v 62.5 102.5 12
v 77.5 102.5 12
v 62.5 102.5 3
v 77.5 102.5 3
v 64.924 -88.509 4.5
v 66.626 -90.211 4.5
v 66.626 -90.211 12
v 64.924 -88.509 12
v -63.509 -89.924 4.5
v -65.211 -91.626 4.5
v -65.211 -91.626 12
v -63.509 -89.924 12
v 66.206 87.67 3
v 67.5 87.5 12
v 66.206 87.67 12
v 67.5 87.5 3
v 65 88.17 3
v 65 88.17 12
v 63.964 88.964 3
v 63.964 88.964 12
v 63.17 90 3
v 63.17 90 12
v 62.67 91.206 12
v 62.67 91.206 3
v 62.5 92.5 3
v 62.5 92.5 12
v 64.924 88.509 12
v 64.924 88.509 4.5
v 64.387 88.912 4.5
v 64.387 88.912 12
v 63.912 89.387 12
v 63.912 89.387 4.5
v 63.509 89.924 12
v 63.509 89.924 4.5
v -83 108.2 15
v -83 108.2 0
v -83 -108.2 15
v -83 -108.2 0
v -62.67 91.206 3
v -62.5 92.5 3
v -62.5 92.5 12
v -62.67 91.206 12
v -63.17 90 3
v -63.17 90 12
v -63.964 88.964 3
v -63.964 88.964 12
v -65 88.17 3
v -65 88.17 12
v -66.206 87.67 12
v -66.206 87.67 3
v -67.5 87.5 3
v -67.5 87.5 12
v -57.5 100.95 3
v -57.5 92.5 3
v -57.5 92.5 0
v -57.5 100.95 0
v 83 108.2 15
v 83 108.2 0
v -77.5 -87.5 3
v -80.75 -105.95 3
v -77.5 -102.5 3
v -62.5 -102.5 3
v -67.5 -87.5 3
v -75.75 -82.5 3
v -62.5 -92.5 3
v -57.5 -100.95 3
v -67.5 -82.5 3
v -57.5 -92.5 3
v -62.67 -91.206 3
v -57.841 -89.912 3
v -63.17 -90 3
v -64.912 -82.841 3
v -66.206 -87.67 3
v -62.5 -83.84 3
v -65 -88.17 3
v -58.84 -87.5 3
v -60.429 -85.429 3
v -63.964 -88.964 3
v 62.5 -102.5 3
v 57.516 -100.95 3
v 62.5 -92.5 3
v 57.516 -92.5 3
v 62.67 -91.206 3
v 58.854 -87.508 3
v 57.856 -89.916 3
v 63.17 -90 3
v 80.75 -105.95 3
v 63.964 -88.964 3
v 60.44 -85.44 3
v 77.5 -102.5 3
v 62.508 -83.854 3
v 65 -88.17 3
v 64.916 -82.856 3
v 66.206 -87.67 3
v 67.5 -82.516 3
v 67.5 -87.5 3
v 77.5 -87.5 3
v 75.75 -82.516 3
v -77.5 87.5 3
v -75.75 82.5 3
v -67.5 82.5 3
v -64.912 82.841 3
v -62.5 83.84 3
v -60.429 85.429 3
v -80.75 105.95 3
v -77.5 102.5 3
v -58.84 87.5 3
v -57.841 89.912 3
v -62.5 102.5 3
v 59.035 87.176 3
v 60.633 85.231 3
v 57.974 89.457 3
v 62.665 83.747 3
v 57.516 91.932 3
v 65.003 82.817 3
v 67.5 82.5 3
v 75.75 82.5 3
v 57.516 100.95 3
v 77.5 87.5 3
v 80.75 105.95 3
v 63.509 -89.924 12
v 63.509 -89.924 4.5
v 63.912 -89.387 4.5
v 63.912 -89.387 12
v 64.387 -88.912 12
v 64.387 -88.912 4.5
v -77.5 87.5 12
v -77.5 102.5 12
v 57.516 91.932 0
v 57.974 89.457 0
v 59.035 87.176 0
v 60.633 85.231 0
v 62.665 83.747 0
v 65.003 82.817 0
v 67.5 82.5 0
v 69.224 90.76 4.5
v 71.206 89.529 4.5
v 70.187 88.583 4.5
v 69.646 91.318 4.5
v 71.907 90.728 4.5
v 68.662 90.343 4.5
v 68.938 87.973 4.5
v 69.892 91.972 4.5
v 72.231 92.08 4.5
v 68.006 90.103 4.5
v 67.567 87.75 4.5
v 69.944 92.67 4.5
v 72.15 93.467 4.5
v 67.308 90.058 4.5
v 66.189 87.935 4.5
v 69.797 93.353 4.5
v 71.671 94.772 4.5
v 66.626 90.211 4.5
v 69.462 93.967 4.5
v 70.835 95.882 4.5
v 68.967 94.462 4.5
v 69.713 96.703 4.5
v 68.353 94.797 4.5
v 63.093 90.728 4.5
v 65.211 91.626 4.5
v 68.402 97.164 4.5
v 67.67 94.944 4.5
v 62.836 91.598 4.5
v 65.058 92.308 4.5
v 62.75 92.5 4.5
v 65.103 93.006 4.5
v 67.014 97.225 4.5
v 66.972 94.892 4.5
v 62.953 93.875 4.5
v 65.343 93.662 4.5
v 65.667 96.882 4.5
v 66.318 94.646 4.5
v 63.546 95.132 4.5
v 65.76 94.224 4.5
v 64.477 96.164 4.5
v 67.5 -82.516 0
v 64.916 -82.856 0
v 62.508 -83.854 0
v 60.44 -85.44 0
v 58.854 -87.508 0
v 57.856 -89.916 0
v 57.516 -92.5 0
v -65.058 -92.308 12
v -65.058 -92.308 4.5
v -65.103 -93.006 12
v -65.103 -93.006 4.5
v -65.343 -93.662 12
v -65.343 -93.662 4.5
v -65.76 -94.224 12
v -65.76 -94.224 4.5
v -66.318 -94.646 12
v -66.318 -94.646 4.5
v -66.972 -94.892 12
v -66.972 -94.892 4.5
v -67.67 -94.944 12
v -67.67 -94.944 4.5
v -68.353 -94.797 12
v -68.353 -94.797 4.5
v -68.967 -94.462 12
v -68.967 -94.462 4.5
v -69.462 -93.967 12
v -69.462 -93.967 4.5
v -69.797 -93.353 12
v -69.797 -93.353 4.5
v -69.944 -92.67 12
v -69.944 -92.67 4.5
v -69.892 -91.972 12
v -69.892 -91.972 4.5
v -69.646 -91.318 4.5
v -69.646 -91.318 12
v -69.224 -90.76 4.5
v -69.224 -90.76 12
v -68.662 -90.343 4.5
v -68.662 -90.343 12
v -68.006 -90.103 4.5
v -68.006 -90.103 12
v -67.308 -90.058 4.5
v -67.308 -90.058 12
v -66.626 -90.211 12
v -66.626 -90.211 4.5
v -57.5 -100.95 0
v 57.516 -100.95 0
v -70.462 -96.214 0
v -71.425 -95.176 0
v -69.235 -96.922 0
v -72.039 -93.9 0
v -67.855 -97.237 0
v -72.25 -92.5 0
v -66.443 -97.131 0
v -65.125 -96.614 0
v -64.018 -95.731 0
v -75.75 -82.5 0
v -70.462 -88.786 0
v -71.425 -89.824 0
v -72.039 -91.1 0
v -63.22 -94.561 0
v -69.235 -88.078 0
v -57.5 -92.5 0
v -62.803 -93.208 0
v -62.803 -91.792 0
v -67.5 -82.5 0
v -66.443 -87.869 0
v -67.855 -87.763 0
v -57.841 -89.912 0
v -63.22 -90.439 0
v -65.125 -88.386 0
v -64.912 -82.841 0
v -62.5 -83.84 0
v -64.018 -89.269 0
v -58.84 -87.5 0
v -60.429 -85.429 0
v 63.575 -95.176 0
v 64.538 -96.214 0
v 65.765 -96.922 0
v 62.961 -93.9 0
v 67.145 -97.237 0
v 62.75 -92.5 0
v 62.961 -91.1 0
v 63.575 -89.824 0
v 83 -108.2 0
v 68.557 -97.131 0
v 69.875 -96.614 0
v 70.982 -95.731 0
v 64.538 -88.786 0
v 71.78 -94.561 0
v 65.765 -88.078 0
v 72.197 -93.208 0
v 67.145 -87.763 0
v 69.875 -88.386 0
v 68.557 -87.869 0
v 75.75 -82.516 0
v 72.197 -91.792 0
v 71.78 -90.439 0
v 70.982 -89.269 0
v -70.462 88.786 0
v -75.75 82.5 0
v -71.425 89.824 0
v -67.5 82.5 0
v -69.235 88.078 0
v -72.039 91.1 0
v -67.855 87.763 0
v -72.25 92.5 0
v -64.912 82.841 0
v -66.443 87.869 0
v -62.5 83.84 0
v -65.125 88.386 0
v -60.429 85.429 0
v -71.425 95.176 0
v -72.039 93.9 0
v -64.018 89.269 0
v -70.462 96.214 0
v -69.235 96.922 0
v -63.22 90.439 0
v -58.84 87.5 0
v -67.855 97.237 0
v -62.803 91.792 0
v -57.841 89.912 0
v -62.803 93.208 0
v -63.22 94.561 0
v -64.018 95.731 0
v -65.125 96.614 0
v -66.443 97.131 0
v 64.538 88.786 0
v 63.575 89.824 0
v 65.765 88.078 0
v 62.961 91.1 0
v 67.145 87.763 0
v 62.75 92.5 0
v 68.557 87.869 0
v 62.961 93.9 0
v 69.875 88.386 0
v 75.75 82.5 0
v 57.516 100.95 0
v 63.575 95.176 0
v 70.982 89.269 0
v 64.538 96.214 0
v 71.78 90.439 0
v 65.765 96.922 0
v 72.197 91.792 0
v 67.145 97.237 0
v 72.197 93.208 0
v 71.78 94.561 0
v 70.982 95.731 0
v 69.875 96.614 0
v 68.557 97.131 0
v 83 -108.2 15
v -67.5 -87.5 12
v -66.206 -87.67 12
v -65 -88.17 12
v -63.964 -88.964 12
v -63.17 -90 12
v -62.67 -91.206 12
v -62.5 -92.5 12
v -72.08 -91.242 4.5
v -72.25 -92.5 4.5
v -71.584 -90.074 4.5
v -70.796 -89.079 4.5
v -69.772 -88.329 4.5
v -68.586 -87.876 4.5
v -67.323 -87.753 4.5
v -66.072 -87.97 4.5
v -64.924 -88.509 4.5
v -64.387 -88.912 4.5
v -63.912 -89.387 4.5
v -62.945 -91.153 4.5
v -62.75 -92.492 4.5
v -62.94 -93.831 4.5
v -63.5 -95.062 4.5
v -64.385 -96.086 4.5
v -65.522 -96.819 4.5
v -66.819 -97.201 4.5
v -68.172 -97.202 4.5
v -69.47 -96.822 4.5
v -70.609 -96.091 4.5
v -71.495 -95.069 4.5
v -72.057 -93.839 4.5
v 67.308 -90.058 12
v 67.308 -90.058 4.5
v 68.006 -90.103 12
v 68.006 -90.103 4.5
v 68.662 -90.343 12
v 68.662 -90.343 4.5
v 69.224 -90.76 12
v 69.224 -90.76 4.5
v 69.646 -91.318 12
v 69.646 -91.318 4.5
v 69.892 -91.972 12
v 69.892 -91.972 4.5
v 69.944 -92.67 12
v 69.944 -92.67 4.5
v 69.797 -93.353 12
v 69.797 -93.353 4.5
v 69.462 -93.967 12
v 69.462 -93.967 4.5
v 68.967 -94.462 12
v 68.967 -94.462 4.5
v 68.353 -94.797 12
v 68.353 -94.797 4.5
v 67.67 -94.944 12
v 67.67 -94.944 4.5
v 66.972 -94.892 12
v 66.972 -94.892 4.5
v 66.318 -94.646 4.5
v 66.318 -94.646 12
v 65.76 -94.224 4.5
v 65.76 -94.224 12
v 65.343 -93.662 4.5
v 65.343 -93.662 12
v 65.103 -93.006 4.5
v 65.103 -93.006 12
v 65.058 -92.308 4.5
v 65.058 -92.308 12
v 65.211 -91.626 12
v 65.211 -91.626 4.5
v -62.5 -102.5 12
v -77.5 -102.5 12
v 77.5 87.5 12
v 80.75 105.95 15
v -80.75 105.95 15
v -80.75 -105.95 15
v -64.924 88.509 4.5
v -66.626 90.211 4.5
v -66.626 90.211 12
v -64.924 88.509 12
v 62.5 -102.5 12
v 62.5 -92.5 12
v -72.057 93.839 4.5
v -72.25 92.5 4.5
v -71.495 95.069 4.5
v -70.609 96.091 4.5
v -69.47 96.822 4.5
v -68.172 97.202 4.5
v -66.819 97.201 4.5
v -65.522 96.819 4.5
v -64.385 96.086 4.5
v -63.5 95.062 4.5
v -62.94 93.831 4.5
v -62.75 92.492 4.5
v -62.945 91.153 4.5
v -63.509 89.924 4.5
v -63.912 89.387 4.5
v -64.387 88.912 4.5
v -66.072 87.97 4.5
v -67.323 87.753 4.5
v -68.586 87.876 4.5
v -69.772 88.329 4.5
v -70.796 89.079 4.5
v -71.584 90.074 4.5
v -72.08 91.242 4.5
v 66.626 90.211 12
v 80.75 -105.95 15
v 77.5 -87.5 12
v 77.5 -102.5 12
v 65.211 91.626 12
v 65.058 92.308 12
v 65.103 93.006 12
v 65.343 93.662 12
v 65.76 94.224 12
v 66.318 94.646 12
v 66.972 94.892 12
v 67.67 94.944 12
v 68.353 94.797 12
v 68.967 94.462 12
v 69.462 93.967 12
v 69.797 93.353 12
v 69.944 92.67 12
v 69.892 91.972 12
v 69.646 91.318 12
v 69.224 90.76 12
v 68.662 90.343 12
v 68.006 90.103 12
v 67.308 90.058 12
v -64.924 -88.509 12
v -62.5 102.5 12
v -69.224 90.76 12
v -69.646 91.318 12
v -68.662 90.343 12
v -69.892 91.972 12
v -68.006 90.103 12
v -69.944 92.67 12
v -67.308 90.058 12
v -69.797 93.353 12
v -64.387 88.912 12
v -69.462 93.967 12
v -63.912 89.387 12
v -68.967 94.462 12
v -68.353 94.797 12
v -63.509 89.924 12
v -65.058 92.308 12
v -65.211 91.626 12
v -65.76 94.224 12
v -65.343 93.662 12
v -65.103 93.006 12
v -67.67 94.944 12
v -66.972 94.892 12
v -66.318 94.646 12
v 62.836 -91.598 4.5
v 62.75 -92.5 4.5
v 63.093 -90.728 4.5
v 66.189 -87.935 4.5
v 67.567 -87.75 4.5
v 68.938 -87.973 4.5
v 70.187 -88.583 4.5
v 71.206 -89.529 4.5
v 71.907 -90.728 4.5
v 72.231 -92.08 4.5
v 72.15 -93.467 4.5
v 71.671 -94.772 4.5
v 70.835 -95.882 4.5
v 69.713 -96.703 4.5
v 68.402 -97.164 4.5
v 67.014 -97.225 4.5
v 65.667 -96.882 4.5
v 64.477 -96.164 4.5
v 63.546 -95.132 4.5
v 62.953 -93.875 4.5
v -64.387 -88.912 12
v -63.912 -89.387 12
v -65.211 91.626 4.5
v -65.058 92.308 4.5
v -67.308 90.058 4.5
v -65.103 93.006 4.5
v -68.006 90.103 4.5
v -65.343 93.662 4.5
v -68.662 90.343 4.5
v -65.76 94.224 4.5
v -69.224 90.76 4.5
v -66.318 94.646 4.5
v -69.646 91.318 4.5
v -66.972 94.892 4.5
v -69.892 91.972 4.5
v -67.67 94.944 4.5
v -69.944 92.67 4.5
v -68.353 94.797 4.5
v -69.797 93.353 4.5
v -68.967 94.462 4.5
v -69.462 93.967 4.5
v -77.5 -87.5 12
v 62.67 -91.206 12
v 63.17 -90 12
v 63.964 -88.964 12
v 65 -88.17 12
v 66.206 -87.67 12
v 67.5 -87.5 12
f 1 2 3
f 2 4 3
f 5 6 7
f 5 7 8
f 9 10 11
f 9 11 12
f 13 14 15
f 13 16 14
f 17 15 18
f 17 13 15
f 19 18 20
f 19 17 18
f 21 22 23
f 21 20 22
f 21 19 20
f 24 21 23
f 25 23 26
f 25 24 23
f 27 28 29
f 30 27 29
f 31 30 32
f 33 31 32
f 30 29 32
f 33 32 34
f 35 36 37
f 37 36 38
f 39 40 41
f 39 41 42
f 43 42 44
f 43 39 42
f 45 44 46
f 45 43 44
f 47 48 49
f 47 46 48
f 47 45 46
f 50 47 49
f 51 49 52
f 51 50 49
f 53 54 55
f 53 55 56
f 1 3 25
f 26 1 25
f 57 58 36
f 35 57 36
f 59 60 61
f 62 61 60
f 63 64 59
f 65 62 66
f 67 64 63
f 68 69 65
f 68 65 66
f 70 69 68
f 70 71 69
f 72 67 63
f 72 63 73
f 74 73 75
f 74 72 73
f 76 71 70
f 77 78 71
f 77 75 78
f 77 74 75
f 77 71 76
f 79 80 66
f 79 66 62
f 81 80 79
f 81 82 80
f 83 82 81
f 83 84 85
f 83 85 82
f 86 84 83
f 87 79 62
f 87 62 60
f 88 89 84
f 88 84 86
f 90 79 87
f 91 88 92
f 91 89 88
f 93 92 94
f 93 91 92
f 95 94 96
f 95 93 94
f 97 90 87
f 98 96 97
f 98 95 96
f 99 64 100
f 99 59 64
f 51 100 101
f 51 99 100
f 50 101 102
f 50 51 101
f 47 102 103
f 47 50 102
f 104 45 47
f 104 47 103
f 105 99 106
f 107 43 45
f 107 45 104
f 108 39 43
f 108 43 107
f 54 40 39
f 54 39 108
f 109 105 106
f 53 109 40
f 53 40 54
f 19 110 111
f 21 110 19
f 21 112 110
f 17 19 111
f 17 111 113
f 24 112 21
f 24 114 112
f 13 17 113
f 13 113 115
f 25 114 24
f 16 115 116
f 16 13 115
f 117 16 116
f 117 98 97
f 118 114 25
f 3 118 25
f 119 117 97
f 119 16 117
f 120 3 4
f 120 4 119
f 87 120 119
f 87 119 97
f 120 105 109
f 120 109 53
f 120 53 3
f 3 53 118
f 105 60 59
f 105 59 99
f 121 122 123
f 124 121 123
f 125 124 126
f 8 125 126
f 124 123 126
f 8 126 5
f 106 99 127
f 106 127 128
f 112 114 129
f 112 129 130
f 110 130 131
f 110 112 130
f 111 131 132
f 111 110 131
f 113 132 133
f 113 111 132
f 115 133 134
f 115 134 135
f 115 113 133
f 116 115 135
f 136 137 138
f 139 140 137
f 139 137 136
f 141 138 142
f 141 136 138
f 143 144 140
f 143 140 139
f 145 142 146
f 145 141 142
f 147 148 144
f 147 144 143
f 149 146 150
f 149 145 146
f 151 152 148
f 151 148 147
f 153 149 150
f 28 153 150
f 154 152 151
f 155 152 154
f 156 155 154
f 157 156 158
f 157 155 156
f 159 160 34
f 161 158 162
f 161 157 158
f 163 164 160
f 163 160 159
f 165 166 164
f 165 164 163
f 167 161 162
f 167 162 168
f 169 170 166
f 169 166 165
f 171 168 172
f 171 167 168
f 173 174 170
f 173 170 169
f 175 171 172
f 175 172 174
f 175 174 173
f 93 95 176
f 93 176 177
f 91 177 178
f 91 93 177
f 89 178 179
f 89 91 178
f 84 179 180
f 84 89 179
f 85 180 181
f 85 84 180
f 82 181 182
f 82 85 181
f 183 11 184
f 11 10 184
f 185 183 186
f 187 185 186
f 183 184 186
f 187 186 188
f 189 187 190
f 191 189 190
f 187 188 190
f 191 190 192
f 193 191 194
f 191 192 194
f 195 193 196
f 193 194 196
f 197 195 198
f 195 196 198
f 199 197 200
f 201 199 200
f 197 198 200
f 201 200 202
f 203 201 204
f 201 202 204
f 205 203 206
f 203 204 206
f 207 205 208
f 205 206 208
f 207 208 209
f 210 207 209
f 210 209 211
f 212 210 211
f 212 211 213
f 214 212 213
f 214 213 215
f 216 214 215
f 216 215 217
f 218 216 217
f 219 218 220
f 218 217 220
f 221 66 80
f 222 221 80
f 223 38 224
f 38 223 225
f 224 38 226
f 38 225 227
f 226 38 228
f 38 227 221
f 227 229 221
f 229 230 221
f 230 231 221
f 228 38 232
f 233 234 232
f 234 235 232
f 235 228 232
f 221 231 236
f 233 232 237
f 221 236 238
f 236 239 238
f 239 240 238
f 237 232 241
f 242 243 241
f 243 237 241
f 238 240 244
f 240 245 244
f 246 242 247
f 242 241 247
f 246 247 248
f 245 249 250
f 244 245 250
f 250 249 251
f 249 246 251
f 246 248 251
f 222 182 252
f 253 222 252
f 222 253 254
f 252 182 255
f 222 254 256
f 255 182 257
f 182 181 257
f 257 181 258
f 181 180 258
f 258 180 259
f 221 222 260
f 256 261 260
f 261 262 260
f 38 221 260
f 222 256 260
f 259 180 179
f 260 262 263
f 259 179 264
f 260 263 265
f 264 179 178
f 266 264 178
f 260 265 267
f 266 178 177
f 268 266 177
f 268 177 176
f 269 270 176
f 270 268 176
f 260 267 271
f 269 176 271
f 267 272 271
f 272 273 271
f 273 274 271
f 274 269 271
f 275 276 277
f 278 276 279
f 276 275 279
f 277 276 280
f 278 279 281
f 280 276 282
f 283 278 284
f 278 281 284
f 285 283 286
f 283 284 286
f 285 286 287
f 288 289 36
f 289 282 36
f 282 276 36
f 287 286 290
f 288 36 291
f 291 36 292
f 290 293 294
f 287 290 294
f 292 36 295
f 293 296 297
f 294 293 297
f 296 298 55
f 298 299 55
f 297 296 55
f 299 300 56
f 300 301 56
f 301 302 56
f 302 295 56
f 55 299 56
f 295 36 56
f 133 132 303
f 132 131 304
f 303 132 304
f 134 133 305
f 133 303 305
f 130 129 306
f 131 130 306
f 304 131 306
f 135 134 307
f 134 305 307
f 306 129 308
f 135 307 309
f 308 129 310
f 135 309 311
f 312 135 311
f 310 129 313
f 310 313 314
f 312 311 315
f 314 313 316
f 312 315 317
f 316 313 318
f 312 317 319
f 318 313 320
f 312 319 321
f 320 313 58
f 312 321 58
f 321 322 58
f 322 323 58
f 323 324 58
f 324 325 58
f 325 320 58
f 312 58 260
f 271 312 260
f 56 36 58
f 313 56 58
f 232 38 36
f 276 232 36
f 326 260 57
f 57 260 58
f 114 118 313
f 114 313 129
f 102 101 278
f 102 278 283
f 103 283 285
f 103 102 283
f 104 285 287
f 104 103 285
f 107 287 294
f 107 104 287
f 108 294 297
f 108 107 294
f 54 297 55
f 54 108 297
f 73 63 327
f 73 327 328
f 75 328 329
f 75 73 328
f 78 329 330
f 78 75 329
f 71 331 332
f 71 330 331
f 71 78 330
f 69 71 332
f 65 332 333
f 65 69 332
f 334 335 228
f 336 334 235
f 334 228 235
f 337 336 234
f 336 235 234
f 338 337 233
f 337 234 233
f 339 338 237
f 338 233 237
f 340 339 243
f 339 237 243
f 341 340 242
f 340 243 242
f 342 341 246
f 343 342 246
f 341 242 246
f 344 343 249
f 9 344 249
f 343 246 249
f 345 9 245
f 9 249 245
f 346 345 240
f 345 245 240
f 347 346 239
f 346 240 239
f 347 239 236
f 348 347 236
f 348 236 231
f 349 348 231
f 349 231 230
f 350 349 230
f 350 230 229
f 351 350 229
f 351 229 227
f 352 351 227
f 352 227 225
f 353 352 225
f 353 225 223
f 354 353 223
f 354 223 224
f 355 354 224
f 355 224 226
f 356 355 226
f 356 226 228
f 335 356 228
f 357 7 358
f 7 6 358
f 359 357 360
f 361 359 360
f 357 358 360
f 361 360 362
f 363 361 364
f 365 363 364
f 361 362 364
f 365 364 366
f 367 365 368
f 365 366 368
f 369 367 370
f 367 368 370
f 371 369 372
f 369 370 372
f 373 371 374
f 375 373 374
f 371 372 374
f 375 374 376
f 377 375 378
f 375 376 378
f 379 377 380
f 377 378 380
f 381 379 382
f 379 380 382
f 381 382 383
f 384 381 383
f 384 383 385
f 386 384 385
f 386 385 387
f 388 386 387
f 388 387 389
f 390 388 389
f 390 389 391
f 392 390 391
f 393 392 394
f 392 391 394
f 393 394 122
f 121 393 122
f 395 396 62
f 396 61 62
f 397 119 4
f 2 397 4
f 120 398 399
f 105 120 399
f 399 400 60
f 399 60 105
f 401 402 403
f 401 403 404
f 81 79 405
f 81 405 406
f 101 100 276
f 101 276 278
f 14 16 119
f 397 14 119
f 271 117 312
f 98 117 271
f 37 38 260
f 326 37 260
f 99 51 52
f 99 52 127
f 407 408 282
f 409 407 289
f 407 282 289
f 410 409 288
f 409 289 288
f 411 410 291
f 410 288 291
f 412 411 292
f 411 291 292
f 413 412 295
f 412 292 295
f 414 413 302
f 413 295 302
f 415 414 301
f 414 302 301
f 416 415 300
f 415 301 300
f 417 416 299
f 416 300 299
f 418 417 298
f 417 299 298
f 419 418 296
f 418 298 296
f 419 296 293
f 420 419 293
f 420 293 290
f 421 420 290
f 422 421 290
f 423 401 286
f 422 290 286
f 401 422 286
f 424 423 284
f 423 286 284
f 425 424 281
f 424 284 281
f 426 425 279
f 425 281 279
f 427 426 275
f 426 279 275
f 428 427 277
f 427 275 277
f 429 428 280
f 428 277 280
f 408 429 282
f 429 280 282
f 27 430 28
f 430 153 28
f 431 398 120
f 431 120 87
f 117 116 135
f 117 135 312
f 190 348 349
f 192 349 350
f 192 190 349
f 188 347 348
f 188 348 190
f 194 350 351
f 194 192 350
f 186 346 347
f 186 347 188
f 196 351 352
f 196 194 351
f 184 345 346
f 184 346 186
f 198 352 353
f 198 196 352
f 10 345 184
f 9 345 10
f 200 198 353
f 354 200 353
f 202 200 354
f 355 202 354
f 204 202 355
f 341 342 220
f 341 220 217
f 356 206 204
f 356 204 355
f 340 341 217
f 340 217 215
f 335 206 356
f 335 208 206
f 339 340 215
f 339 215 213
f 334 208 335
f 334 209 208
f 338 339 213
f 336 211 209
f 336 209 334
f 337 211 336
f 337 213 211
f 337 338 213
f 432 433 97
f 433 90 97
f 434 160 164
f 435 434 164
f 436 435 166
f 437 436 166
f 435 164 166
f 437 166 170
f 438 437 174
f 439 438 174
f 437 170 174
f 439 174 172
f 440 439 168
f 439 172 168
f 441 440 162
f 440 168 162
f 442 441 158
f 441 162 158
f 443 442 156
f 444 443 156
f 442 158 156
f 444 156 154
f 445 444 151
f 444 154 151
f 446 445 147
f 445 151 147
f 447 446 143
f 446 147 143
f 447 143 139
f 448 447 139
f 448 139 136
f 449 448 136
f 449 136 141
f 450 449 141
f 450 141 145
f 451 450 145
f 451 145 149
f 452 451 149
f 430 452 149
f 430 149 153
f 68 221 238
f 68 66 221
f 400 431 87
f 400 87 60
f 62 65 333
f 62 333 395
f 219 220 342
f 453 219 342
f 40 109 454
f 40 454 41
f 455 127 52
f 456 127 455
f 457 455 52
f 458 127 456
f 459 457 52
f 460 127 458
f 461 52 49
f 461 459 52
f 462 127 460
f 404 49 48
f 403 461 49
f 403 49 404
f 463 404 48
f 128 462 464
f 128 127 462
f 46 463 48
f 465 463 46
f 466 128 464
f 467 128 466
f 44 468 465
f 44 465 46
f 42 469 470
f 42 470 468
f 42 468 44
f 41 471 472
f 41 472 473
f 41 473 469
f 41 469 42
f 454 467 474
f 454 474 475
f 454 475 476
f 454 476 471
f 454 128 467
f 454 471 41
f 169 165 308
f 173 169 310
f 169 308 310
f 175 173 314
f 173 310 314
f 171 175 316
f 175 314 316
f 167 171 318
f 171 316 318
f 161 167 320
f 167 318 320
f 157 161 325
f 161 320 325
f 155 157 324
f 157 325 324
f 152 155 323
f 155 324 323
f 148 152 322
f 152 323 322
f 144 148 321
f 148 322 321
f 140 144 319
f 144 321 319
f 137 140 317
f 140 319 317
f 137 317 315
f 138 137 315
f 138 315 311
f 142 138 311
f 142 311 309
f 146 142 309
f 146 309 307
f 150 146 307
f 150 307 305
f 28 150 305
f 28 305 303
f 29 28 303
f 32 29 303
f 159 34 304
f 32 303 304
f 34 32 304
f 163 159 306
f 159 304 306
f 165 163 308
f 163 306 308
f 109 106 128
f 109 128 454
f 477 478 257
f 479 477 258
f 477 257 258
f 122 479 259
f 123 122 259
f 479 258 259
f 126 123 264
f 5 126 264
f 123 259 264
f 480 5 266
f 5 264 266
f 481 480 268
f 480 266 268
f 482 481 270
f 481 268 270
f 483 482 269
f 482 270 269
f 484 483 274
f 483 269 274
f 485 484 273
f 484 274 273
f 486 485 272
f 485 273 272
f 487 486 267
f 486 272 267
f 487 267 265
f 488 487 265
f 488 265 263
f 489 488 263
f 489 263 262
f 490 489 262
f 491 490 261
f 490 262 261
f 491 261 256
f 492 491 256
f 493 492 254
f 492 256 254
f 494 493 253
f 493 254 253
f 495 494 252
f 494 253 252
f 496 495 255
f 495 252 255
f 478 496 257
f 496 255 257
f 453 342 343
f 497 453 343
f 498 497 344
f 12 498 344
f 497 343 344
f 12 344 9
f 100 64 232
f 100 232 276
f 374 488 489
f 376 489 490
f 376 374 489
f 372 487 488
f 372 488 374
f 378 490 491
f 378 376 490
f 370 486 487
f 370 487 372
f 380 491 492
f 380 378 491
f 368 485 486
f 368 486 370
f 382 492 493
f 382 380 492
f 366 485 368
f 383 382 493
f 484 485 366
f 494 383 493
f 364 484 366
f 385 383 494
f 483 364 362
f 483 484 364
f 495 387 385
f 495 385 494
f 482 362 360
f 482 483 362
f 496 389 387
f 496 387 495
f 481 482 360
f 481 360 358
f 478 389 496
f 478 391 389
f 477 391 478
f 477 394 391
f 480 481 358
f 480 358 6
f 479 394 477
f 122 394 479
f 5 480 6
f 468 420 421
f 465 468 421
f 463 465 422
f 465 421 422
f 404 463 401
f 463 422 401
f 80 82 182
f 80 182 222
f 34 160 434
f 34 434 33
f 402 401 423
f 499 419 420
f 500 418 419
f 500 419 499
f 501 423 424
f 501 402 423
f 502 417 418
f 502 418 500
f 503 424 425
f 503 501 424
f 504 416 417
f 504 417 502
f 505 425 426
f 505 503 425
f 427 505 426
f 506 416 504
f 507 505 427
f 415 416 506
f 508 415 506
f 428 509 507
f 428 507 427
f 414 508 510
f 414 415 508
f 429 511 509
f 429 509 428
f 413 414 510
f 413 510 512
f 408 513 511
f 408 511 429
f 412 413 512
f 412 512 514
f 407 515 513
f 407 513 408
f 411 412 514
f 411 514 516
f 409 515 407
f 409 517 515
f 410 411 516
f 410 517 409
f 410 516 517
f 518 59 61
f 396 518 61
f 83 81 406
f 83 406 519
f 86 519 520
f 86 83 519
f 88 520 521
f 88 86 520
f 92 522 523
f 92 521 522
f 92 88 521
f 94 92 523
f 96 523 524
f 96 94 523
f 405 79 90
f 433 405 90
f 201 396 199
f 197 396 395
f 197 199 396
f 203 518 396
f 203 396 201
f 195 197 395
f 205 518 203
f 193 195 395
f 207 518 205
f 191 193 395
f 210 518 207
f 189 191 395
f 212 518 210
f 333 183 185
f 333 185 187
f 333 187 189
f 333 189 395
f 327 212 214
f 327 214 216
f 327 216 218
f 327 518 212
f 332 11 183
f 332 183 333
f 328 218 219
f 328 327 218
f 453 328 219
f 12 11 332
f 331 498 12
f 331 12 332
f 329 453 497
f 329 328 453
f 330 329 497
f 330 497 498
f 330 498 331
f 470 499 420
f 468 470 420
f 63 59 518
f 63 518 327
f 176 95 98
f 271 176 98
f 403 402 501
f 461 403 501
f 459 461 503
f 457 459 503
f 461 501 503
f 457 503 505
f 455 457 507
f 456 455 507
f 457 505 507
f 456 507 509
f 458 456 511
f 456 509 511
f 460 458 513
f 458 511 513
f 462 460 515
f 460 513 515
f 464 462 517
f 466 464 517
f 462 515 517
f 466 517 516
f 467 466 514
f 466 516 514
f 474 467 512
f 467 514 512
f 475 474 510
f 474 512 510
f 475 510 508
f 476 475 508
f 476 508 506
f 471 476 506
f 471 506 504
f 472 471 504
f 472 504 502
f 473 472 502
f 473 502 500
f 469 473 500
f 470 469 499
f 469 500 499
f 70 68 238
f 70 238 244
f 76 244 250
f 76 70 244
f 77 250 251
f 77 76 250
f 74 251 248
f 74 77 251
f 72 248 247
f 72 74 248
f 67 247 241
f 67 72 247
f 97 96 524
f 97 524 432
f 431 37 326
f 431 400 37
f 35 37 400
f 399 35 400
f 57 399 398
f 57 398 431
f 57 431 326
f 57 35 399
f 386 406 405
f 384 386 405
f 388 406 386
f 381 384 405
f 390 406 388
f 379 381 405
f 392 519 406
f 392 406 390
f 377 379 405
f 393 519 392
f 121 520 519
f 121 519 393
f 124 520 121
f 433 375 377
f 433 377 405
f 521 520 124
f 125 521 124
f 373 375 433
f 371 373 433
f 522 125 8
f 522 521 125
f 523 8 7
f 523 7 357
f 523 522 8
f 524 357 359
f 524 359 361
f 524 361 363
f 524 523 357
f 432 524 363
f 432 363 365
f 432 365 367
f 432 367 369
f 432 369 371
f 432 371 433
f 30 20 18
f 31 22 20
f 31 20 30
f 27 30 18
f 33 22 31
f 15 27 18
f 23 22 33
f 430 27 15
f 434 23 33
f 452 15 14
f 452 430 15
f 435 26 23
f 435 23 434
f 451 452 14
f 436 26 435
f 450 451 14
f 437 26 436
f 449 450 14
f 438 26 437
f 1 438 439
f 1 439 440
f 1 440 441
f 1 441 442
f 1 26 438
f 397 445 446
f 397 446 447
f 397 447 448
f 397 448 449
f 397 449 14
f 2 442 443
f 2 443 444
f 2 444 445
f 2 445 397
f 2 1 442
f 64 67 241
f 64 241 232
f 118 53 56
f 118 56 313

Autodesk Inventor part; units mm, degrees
ref_plane "YZ Plane" through (0, 0, 0) normal (1, 0, 0) x (0, 1, 0)
ref_plane "XZ Plane" through (0, 0, 0) normal (0, 1, 0) x (-1, 0, 0)
ref_plane "XY Plane" through (0, 0, 0) normal (0, 0, 1) x (1, 0, 0)
sketch "Boceto1" plane through (0, 0, 0) normal (0, 0, 1) x (1, 0, 0)
  line L0 (-83, -108.2) -> (83, -108.2)
  line L1 (83, -108.2) -> (83, 108.2)
  line L2 (83, 108.2) -> (-83, 108.2)
  line L3 (-83, 108.2) -> (-83, -108.2)
  line L4 (-83, -108.2) -> (83, 108.2) construction
  line L5 (83, -108.2) -> (-83, 108.2) construction
  point P0 (0, 0)
  dimension "d0" = 166
  dimension "d1" = 216.4
extrude "Extrusión1" add sketch "Boceto1" along normal blind 15
sketch "Boceto2" plane through (0, 0, 15) normal (0, 0, 1) x (1, 0, 0)
  line L0 (80.75, -105.95) -> (-80.75, -105.95)
  line L1 (-80.75, -105.95) -> (-80.75, 105.95)
  line L2 (80.75, 105.95) -> (-80.75, 105.95)
  line L3 (80.75, 105.95) -> (80.75, -105.95)
  line L4 (-83, 108.2) -> (83, 108.2)
  line L5 (83, 108.2) -> (83, -108.2)
  line L6 (83, -108.2) -> (-83, -108.2)
  line L7 (-83, -108.2) -> (-83, 108.2)
  point P0 (0, 0)
extrude "Extrusión2" cut sketch "Boceto2" against normal blind 12 contours L0 L1 L2 L3
sketch "Boceto3" plane through (0, 0, 3) normal (0, 0, 1) x (1, 0, 0)
  line L0 (-67.5, -92.5) -> (67.5, -92.5)
  line L1 (67.5, -92.5) -> (67.5, 92.5)
  line L2 (67.5, 92.5) -> (-67.5, 92.5)
  line L3 (-67.5, 92.5) -> (-67.5, -92.5)
  line L4 (-67.5, 87.5) -> (-72.5, 87.5)
  line L5 (-62.5, 97.5) -> (-62.5, 92.5)
  line L6 (62.5, -97.5) -> (62.5, -92.5)
  line L7 (67.5, -87.5) -> (72.5, -87.5)
  line L8 (-72.5, -87.5) -> (-67.5, -87.5)
  line L9 (-62.5, -92.5) -> (-62.5, -97.5)
  line L10 (-72.5, 87.5) -> (-77.5, 87.5)
  line L11 (-77.5, 87.5) -> (-77.5, 102.5)
  line L12 (-77.5, 102.5) -> (-62.5, 102.5)
  line L13 (-62.5, 102.5) -> (-62.5, 97.5)
  line L14 (77.5, 87.5) -> (77.5, 102.5)
  line L15 (77.5, 102.5) -> (62.5, 102.5)
  line L16 (67.5, -87.5) -> (77.5, -87.5)
  line L17 (62.5, -92.5) -> (62.5, -102.5)
  line L18 (62.5, -102.5) -> (77.5, -102.5)
  line L19 (77.5, -102.5) -> (77.5, -87.5)
  line L20 (-67.5, -87.5) -> (-77.5, -87.5)
  line L21 (-77.5, -87.5) -> (-77.5, -102.5)
  line L22 (-77.5, -102.5) -> (-62.5, -102.5)
  line L23 (-62.5, -102.5) -> (-62.5, -97.5)
  line L24 (67.5, 87.5) -> (77.5, 87.5)
  line L25 (62.5, 102.5) -> (62.5, 92.5)
  arc A0 (-62.5, -92.5) -> (-67.5, -87.5) centre (-67.5, -92.5) ccw
  arc A1 (-67.5, 87.5) -> (-62.5, 92.5) centre (-67.5, 92.5) ccw
  arc A2 (62.5, 92.5) -> (67.5, 87.5) centre (67.5, 92.5) ccw
  arc A3 (67.5, -87.5) -> (62.5, -92.5) centre (67.5, -92.5) ccw
  point P0 (0, 0)
  dimension "d12" = 135
  dimension "d13" = 185
  dimension "d56" = 5
  dimension "d57" = 15
  dimension "d58" = 15
extrude "Extrusión3" add sketch "Boceto3" along normal blind 9 contours L3 A0 L0 | L0 L9 L23 L22 L21 L20 L8 L3 | A3 L1 L0 | L0 L1 L7 L16 L19 L18 L17 L6 | L4 L10 L11 L12 L13 L5 L2 L3 | L3 L2 A1 | A2 L2 L1 | L1 L2 L25 L15 L14 L24
sketch "Boceto4" plane through (0, 0, 0) normal (0, 0, -1) x (-1, 0, 0)
  line L0 (80.75, -105.95) -> (80.75, 105.95) projected
  line L1 (-80.75, -105.95) -> (80.75, -105.95) projected
  line L2 (-80.75, 105.95) -> (-80.75, -105.95) projected
  line L3 (80.75, 105.95) -> (-80.75, 105.95) projected
  line L4 (-67.5, -92.5) -> (-67.5, 92.5) projected
  line L5 (67.5, 92.5) -> (67.5, -92.5) projected
  line L6 (-67.5, 92.5) -> (67.5, 92.5) projected
  line L7 (67.5, -92.5) -> (-67.5, -92.5) projected
  circle A0 centre (-67.5, 92.5) radius 4.75
  circle A1 centre (67.5, 92.5) radius 4.75
  circle A2 centre (67.5, -92.5) radius 4.75
  circle A3 centre (-67.5, -92.5) radius 4.75
  point P0 (0, 0)
  dimension "d24" = 9.5
  dimension "d25" = 9.5
  dimension "d26" = 9.5
  dimension "d27" = 9.5
extrude "Extrusión4" cut sketch "Boceto4" against normal blind 4.5 contours L7 A3 L4 | L4 A3 L7 | A0 L6 L4 | L4 L6 A0 | A2 L5 L7 | L7 L5 A2 | A1 L5 L6 | L6 L5 A1
sketch "Boceto7" plane through (-67.5, 92.5, 4.5) normal (0, 0, -1) x (-1, 0, 0)
  arc A0 (-0.8744, -2.2886) -> (-2.2886, -0.8744) centre (0, 0) ccw
  line L0 (0, 0) -> (4.75, 0) construction
  line L1 (-2.2886, -0.8744) -> (-3.9906, -2.5764)
  line L2 (-0.8744, -2.2886) -> (-2.5764, -3.9906)
  arc A1 (-3.9906, -2.5764) -> (-2.5764, -3.9906) centre (0, 0) ccw
  arc A2 (-132.7114, -0.8744) -> (-134.1256, -2.2886) centre (-135, 0) ccw
  line L3 (-134.1256, -2.2886) -> (-132.4236, -3.9906)
  line L4 (-132.7114, -0.8744) -> (-131.0094, -2.5764)
  arc A3 (-132.4236, -3.9906) -> (-131.0094, -2.5764) centre (-135, 0) ccw
  arc A4 (-134.1256, -182.7114) -> (-132.7114, -184.1256) centre (-135, -185) ccw
  line L5 (-132.7114, -184.1256) -> (-131.0094, -182.4236)
  line L6 (-134.1256, -182.7114) -> (-132.4236, -181.0094)
  arc A5 (-131.0094, -182.4236) -> (-132.4236, -181.0094) centre (-135, -185) ccw
  arc A6 (-2.2886, -184.1256) -> (-0.8744, -182.7114) centre (0, -185) ccw
  line L7 (-0.8744, -182.7114) -> (-2.5764, -181.0094)
  line L8 (-2.2886, -184.1256) -> (-3.9906, -182.4236)
  arc A7 (-2.5764, -181.0094) -> (-3.9906, -182.4236) centre (0, -185) ccw
  point P0 (-67.5, -92.5)
extrude "Extrusión7" cut sketch "Boceto7" against normal blind 10
sketch "Boceto8" plane through (0, 0, 3) normal (0, 0, 1) x (1, 0, 0)
  line L0 (80.75, -105.95) -> (-80.75, -105.95) projected
  line L1 (-62.5, -105.95) -> (-57.5, -105.95)
  line L2 (-57.5, -100.95) -> (57.5161, -100.95)
  line L3 (67.5, -87.5) -> (77.5, -87.5) projected
  line L4 (57.5161, -92.5) -> (57.5161, -100.95)
  line L5 (-57.5, -100.95) -> (-57.5, -92.5)
  line L6 (-67.5, -82.5) -> (-75.75, -82.5)
  line L7 (-77.5, 87.5) -> (-67.5, 87.5) projected
  line L8 (-62.5, 92.5) -> (-62.5, 102.5) projected
  line L9 (-80.75, 105.95) -> (80.75, 105.95) projected
  line L10 (-75.75, 82.5) -> (-67.5, 82.5)
  line L11 (-57.5, 92.5) -> (-57.5, 100.95)
  line L12 (-75.75, -82.5) -> (-75.75, 82.5)
  line L13 (-57.5, 100.95) -> (57.5161, 100.95)
  line L14 (57.5161, 100.95) -> (57.5161, 91.9319)
  line L15 (67.5, 82.5) -> (75.75, 82.5)
  line L16 (75.75, 82.5) -> (75.75, -82.5161)
  arc A0 (65.2114, -91.6256) -> (66.6256, -90.2114) centre (67.5, -92.5) ccw projected
  line L17 (67.5, -82.5161) -> (75.75, -82.5161)
  arc A1 (-66.6256, -90.2114) -> (-65.2114, -91.6256) centre (-67.5, -92.5) ccw projected
  arc A2 (-57.5, -92.5) -> (-67.5, -82.5) centre (-67.5, -92.5) ccw
  arc A3 (-65.2114, 91.6256) -> (-66.6256, 90.2114) centre (-67.5, 92.5) ccw projected
  arc A4 (-67.5, 82.5) -> (-57.5, 92.5) centre (-67.5, 92.5) ccw
  arc A5 (67.5, -82.5161) -> (57.5161, -92.5) centre (67.5, -92.5) ccw
  arc A6 (66.6256, 90.2114) -> (65.2114, 91.6256) centre (67.5, 92.5) ccw projected
  arc A7 (57.5, 92.5) -> (67.5, 82.5) centre (67.5, 92.5) ccw
  point P0 (0, 0)
extrude "Extrusión8" cut sketch "Boceto8" against normal blind 10
properties part number "TestTapa_v1"
